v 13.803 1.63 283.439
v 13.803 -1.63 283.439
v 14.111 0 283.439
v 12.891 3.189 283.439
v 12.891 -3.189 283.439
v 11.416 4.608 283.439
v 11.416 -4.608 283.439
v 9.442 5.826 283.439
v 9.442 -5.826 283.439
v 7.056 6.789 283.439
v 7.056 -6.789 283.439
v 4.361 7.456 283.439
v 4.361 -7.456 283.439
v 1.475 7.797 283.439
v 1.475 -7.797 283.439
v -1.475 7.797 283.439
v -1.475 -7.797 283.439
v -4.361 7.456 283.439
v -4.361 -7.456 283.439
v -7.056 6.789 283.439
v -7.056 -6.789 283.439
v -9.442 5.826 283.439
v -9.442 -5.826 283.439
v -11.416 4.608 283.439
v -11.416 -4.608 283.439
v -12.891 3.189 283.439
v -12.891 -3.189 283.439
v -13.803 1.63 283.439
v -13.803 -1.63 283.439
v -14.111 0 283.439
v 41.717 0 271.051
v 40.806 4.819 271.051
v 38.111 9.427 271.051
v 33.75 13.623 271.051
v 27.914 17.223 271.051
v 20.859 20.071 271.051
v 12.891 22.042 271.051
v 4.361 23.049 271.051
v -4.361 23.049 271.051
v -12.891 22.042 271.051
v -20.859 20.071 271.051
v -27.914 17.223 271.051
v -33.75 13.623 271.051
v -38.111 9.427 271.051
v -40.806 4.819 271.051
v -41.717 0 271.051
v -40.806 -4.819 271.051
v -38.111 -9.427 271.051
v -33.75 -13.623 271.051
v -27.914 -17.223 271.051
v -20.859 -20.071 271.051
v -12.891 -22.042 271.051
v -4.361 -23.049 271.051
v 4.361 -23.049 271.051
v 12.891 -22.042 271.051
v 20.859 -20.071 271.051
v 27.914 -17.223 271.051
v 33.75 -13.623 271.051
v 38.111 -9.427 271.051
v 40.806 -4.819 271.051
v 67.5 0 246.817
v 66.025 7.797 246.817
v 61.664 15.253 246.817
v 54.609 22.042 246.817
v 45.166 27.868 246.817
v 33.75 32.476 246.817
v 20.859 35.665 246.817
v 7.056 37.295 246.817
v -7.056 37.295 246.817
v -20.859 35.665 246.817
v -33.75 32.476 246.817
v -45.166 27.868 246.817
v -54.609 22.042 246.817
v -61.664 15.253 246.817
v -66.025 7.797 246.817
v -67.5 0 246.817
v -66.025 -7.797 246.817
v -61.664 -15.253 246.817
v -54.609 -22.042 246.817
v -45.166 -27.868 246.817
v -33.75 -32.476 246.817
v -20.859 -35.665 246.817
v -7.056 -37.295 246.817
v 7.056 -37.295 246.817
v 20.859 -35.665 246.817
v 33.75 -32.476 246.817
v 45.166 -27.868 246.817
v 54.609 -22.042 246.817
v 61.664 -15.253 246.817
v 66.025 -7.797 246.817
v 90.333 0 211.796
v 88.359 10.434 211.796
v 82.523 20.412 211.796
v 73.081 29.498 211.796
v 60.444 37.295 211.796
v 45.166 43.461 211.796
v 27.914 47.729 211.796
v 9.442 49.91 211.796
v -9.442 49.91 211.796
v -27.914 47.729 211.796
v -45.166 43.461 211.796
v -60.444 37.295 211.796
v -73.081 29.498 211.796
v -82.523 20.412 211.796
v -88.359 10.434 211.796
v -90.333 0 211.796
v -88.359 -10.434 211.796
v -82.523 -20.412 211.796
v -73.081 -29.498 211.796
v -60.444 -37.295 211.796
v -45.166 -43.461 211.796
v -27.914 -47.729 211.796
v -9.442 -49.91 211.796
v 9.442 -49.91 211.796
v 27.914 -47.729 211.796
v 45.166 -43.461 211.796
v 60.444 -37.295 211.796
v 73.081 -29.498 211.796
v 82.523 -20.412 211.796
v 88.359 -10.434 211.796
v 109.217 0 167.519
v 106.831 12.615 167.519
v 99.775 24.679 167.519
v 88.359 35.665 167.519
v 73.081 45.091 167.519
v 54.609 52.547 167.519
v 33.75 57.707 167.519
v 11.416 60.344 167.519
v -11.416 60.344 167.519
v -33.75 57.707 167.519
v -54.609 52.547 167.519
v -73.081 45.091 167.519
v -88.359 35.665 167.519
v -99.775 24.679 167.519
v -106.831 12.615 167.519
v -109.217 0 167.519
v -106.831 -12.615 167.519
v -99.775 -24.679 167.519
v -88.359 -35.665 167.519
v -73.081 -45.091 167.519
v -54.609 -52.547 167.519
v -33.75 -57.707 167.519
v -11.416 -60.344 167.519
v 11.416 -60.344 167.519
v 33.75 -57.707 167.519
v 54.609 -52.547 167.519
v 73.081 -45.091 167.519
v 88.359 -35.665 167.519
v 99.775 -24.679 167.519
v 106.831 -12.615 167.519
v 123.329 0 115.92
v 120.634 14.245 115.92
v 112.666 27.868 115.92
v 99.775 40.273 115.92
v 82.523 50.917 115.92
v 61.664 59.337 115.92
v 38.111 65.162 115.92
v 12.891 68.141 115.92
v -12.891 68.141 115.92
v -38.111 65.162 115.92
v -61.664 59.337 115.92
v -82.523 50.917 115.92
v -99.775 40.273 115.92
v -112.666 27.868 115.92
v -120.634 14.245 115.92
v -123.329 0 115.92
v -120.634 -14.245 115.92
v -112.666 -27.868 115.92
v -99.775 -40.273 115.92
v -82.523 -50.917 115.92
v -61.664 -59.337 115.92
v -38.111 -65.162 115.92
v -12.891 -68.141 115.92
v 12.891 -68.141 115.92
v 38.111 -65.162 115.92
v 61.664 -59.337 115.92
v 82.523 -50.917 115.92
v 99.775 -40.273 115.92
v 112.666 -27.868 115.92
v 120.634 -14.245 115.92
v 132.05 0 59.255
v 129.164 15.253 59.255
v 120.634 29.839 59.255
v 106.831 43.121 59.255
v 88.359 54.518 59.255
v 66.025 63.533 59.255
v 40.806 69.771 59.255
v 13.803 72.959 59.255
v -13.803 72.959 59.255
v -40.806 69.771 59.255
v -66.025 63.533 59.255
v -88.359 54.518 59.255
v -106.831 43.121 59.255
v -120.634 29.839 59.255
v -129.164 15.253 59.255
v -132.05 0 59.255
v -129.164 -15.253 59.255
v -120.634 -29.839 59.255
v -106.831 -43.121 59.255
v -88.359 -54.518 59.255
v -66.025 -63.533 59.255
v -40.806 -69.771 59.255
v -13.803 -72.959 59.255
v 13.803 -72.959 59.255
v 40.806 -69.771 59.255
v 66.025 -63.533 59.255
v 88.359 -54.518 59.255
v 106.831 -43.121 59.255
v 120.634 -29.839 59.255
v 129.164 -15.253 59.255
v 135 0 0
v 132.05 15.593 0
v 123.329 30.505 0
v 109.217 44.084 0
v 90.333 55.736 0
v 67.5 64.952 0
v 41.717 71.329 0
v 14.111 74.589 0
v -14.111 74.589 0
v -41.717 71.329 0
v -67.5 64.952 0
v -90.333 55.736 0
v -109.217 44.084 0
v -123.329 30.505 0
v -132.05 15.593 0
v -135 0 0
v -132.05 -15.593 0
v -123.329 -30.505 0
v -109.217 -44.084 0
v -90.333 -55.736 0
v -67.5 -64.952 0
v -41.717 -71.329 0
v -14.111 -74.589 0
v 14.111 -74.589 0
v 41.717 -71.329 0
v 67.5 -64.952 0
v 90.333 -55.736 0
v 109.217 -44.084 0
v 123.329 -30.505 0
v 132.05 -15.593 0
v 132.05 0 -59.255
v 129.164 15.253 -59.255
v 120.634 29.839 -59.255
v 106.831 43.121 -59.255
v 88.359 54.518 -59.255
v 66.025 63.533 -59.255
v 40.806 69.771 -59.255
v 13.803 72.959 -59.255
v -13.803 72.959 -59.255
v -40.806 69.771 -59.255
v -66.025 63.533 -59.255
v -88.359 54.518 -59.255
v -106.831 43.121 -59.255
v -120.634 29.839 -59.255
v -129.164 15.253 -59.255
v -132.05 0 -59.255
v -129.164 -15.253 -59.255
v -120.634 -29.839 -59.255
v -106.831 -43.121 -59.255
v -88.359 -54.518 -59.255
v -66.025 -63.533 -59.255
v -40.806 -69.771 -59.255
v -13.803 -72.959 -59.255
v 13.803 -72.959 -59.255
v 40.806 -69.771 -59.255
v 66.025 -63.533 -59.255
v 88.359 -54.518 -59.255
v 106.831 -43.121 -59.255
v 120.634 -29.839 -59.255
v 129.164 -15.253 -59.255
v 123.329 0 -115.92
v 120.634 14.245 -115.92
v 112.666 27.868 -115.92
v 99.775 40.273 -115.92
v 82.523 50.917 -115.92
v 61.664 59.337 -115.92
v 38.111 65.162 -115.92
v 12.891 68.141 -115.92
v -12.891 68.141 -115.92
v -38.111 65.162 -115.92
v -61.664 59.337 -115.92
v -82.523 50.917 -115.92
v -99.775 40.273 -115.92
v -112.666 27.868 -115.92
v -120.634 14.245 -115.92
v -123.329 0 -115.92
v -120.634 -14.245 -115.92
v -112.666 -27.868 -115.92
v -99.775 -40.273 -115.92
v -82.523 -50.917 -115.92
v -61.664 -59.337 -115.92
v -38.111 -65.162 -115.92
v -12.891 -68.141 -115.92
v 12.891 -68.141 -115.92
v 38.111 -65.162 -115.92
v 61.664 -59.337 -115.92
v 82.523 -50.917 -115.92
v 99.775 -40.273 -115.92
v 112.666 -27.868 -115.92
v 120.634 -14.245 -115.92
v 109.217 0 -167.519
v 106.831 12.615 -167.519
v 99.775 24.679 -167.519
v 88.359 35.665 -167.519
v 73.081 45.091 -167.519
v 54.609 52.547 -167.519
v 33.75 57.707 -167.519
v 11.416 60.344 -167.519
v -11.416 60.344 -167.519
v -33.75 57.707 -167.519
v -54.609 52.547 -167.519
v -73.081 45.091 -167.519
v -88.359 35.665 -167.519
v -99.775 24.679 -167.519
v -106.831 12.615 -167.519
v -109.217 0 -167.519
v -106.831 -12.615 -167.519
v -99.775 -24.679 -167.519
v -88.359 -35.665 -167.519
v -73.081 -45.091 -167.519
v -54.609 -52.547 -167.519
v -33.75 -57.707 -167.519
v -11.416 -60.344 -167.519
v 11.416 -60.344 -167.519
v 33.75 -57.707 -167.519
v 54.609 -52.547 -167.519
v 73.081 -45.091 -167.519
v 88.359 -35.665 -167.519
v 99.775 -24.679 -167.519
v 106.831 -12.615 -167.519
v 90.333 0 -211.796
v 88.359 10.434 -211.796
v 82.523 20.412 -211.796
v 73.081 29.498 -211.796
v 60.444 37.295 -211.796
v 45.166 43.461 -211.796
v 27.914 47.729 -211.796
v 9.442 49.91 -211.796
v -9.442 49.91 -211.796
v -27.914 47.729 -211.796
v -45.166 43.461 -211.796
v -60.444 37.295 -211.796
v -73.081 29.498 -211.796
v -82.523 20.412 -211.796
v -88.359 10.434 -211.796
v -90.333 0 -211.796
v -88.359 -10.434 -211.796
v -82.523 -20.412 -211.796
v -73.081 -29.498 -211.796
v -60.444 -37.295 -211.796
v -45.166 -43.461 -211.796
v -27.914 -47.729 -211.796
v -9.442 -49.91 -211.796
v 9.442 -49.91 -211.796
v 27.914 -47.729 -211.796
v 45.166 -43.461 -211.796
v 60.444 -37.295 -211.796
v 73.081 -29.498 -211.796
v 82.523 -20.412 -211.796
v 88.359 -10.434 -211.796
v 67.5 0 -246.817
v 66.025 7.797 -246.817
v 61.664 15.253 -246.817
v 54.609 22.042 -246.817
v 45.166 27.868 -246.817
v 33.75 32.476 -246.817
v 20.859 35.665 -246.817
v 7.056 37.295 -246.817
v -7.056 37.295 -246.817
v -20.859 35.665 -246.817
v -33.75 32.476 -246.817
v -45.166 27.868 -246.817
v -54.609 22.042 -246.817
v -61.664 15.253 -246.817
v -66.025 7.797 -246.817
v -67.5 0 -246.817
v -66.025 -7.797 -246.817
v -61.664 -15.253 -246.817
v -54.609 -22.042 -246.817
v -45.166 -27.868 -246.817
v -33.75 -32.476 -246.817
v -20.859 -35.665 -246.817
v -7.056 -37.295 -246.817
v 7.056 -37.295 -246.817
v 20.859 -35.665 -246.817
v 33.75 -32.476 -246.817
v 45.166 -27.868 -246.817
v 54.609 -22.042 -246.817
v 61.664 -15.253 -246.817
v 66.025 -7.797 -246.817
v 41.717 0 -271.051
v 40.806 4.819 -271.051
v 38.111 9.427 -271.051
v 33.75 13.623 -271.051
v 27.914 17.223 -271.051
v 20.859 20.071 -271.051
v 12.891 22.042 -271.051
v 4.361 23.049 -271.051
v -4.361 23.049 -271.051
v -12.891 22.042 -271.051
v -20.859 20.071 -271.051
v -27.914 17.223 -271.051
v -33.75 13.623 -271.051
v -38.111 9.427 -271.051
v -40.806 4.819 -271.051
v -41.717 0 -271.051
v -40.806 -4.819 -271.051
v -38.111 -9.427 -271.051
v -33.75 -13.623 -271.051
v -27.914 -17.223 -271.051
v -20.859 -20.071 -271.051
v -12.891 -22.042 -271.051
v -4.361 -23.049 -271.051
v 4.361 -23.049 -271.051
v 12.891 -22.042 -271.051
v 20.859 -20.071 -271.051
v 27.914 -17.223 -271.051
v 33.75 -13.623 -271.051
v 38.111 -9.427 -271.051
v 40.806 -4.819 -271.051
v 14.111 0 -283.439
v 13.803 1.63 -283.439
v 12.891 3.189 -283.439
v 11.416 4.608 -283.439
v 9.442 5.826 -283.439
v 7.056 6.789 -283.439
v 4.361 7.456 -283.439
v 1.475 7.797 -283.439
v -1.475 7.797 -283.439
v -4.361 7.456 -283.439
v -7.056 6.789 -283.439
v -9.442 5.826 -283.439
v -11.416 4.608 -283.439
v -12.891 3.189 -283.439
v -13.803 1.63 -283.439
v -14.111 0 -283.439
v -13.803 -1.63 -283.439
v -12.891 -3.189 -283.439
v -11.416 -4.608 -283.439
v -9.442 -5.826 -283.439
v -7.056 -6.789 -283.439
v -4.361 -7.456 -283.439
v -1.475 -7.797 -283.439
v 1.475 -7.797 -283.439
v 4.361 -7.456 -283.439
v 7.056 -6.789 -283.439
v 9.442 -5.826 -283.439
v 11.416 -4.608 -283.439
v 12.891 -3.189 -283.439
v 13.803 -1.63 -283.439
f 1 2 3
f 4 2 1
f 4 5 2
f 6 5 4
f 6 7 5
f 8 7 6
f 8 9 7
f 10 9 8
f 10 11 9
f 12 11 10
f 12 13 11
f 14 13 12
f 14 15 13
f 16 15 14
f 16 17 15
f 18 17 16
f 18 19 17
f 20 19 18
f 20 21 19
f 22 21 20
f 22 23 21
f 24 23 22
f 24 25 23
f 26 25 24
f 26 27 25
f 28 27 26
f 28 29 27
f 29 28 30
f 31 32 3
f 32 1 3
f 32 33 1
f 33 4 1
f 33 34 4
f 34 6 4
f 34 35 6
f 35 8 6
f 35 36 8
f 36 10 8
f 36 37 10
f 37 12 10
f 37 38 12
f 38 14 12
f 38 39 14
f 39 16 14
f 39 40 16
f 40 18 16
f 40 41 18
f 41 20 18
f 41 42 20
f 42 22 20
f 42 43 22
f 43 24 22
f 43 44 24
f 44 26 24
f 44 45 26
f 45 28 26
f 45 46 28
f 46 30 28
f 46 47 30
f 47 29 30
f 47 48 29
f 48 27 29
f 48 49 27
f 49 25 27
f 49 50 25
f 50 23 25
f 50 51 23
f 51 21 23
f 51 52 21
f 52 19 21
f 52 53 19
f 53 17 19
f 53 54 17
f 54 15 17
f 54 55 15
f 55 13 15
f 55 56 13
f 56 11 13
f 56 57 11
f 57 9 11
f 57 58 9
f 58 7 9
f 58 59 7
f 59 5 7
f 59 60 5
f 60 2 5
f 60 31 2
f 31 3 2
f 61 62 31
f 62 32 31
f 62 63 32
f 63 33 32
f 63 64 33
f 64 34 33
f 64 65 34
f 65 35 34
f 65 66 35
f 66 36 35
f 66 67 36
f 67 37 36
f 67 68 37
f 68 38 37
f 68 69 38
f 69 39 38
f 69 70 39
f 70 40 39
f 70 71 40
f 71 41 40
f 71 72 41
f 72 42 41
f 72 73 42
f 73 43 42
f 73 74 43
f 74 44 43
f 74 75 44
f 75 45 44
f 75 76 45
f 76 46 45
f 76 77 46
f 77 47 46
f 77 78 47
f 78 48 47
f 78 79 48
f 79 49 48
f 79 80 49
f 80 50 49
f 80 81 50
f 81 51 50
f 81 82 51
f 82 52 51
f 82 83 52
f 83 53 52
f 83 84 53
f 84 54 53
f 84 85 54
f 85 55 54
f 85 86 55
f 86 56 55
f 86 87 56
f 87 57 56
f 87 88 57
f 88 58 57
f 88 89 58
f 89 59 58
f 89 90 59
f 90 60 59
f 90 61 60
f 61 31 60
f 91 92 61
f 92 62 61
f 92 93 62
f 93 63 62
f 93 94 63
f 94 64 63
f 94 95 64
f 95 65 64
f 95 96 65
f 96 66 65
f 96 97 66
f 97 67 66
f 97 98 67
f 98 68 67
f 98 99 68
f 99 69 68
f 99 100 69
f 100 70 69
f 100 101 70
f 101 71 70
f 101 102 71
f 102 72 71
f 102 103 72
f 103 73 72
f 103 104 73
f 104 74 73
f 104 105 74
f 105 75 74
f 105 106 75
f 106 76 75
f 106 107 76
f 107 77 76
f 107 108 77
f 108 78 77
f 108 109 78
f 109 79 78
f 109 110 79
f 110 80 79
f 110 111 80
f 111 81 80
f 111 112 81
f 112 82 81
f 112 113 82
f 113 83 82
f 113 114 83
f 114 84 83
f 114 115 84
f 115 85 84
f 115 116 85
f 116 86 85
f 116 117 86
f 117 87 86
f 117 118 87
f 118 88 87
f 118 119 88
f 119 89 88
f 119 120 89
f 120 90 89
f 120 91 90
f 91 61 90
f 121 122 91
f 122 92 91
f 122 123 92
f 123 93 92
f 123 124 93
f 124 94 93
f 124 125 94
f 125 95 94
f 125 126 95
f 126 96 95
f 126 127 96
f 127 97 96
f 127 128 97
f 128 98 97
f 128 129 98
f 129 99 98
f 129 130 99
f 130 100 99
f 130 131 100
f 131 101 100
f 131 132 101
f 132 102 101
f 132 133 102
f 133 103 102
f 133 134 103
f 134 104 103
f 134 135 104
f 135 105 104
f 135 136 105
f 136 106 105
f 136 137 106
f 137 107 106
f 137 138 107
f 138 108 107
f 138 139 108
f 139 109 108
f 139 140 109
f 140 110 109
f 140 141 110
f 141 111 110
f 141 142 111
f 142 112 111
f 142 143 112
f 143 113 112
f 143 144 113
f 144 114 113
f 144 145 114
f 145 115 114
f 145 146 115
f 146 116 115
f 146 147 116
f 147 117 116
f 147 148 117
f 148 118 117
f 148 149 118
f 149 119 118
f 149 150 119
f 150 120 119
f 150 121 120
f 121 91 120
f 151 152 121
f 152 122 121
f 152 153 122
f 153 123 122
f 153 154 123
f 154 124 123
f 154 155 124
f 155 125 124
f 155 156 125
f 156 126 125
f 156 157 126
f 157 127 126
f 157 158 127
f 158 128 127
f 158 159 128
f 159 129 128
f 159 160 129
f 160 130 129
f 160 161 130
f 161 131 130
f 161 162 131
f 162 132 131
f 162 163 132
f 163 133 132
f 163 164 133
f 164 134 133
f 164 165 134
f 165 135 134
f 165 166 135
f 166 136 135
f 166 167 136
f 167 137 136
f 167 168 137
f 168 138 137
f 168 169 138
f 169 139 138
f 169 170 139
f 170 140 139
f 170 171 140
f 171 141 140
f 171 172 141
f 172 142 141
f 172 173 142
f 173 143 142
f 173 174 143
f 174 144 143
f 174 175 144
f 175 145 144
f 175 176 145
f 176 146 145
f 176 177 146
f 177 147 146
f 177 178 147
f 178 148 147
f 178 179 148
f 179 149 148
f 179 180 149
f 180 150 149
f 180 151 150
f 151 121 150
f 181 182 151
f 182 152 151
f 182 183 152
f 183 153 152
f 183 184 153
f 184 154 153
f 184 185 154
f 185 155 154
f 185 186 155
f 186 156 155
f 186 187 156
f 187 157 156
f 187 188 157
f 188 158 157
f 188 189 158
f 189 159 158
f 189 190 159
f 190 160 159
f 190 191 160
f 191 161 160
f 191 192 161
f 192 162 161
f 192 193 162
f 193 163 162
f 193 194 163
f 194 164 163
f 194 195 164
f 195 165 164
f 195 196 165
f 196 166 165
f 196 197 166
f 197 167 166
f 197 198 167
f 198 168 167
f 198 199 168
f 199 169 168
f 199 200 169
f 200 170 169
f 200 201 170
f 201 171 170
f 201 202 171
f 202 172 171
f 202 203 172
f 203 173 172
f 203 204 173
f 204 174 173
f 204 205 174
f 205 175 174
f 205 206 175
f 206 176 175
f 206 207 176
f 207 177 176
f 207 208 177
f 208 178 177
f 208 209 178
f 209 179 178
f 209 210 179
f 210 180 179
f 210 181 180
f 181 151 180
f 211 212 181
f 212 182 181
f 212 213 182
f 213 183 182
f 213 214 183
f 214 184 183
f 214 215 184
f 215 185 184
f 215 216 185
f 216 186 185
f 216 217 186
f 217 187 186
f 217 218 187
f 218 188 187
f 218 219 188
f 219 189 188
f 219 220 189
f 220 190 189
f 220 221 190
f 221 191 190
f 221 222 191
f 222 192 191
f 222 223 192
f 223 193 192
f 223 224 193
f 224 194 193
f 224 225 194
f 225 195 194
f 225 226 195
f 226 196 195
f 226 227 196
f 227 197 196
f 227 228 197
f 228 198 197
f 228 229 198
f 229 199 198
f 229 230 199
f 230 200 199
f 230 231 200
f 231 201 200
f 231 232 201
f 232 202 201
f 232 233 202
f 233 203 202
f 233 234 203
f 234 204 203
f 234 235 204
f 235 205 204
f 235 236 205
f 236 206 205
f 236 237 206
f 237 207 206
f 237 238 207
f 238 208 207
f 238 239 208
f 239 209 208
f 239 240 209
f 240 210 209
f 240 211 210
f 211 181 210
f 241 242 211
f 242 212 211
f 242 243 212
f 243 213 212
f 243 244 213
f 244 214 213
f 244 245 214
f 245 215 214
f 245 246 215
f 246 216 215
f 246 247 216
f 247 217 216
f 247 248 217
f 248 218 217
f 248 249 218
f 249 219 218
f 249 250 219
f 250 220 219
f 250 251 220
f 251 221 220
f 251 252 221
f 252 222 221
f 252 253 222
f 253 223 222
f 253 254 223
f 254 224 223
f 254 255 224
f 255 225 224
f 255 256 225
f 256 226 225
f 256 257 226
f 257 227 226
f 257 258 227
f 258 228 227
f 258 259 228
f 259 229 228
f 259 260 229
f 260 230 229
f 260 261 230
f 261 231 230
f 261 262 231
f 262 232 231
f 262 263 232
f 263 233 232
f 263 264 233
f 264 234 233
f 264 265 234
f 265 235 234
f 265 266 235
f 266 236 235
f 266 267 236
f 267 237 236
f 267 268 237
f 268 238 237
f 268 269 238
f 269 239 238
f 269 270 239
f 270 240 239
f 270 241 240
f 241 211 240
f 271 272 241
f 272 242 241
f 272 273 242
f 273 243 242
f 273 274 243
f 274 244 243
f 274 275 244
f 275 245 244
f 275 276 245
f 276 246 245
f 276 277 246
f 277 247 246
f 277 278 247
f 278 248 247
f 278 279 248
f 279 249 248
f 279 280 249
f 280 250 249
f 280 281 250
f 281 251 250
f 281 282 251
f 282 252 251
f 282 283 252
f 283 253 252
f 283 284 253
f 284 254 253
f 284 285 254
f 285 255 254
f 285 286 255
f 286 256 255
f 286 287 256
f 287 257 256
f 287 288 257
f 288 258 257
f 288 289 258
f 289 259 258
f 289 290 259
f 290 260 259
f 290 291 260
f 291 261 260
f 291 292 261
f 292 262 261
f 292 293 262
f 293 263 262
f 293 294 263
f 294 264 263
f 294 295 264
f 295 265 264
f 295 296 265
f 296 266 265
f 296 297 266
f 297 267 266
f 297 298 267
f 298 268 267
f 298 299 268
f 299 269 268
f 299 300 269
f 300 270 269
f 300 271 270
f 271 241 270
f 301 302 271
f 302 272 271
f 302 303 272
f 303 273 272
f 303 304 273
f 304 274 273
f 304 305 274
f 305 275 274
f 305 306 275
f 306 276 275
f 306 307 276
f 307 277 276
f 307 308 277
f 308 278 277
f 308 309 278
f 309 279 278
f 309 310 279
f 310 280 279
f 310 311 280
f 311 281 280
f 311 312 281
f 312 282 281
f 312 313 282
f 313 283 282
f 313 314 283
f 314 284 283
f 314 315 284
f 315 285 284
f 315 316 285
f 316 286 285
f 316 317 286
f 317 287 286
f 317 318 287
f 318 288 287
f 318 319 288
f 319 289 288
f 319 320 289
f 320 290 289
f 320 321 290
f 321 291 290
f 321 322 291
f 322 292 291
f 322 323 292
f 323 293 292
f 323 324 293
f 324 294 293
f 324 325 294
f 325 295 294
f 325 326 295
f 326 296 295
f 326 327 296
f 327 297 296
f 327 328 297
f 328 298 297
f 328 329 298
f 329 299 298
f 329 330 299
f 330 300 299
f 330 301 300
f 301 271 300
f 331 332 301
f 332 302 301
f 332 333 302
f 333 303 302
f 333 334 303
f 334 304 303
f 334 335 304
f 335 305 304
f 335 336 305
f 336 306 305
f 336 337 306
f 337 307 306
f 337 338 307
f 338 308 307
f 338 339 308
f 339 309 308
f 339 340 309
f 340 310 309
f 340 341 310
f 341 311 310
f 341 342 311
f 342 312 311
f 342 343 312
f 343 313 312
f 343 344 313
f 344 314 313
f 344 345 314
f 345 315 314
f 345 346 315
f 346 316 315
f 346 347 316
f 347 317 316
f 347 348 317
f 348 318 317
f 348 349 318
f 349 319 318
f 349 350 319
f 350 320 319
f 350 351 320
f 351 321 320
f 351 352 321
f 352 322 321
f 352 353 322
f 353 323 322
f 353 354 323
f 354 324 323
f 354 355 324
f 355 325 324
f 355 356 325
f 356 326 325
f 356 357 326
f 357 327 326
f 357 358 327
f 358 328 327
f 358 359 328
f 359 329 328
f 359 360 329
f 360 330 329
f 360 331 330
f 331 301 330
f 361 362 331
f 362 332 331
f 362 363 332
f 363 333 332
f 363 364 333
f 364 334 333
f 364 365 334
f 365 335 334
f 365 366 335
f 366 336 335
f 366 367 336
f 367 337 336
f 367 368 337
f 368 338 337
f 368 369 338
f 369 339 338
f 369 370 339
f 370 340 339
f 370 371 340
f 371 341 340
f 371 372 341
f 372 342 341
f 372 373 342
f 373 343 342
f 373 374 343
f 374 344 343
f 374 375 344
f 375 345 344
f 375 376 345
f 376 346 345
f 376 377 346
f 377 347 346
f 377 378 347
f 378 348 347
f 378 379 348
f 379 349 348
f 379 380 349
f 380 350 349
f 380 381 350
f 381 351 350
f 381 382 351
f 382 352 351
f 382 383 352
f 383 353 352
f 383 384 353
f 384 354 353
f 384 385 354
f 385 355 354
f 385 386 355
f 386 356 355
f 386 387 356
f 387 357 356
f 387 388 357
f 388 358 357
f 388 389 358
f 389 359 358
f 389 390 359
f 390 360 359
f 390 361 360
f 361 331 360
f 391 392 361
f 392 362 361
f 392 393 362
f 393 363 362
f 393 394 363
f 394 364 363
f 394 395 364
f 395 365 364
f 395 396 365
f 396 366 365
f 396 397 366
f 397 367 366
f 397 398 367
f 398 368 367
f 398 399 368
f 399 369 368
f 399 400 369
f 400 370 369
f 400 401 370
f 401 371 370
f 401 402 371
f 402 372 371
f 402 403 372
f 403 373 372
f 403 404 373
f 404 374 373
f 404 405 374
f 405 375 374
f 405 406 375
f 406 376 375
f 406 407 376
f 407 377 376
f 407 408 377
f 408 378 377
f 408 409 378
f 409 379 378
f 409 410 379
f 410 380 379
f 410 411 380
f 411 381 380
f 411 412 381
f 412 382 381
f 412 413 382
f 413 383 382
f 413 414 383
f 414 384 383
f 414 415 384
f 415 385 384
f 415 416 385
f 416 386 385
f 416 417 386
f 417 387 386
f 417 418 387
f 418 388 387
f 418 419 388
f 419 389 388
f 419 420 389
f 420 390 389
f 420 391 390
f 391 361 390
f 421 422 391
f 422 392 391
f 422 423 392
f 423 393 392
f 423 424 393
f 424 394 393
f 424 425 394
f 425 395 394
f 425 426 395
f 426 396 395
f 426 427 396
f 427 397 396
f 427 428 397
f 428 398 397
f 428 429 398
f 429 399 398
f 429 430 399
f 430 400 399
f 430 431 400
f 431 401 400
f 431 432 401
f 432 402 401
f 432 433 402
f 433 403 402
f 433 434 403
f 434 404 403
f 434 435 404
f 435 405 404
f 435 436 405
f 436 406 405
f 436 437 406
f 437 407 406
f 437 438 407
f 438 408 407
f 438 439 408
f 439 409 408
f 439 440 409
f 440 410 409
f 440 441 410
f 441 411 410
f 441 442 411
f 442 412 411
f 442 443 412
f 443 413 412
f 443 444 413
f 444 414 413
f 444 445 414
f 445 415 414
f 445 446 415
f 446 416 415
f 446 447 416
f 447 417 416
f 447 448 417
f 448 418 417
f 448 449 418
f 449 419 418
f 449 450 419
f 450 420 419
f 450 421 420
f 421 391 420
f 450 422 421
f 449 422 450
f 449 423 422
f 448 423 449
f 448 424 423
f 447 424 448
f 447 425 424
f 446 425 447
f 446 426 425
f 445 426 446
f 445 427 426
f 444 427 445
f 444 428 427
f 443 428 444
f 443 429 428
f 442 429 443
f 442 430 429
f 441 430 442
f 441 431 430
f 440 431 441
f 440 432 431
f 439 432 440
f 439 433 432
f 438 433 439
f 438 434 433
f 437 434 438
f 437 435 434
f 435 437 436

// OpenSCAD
// Generated by SolidPython 1.0.1 on 2020-07-29 00:46:48


scale(v = [9, 5, 19]) {
	sphere(r = 15);
}
/***********************************************
*********      SolidPython code:      **********
************************************************
 
# import packages: SolidPython
from solid import *
from solid.utils import *
from itertools import chain, combinations, permutations


class Resize:

    def __init__(self, scad_file):
        self.scad_file = scad_file
        #self.scad_file = import_scad(scad_file)
        # cone/cylinder param:
        self.r1 = 0
        self.r2 = 0
        self.h = 0
        # rectangular prism param:
        self.w = 0
        self.l = 0
        # ellipse param:
        self.r = 0

    # import OpenScad code (file name corresponds to shape)


    # classify shape + parameters
    def assign(self, param1, param2, param3):
        if self.scad_file == 'cone.scad':
            self.r1 = param1
            self.r2 = param2
            self.h = param3
        elif self.scad_file == 'cylinder.scad':
            self.r1 = param1
            self.r2 = param2
            self.h = param3
        elif self.scad_file == 'rectangularPrism.scad':
            self.h = param1
            self.l = param2
            self.w = param3
        else:
            self.r = param1
            self.h = param2

    # resize parameters
    def iterate(self):
        x = range(3, 20, 2)
        i = 1
        if self.scad_file == 'cone.scad':
            tempList = list(permutations(x, 2))
            for temp in tempList:
                param1 = temp[0]
                param2 = temp[1]
                filepath = 'produced_scad_files/' + 'cone' + str(param1) + '_' + str(param2) + '_' + '.scad'
                scad_render_to_file(cylinder(h=param1, r1=param2, r2=0), filepath)

        elif self.scad_file == 'cylinder.scad':
            tempList = list(permutations(x, 3))
            for temp in tempList:
                param1 = temp[0]
                param2 = temp[1]
                filepath = 'produced_scad_files/' + 'cylinder' + str(param1) + '_' + str(param2) + '_' + '.scad'
                scad_render_to_file(cylinder(h=param1, r1=param2, r2=param2), filepath)

        elif self.scad_file == 'rectangularPrism.scad':
            tempList = list(permutations(x, 3))
            for temp in tempList:
                param1 = temp[0]
                param2 = temp[1]
                param3 = temp[2]
                filepath = 'produced_scad_files/' + 'rectangularPrism' + str(param1) + '_' + str(param2) + '_' + str(
                    param3) + '.scad'
                scad_render_to_file(cube(size=(param1, param2, param3)), filepath)

        elif self.scad_file == 'ellipse.scad':
            tempList = list(permutations(x, 4))
            for temp in tempList:
                param1 = temp[0]
                param2 = temp[1]
                param3 = temp[2]
                param4 = temp[3]
                filepath = 'produced_scad_files/' + 'ellipse' + str(param1) + '_' + str(param2) + '_' + str(param3) + '_' + str(param4) + '.scad'
                scad_render_to_file(scale([param1, param2, param3])(sphere(r=param4)), filepath)

    def render_to_scadfile(self):
        scad_render_to_file(scad, 'example.scad') 
 
************************************************/
